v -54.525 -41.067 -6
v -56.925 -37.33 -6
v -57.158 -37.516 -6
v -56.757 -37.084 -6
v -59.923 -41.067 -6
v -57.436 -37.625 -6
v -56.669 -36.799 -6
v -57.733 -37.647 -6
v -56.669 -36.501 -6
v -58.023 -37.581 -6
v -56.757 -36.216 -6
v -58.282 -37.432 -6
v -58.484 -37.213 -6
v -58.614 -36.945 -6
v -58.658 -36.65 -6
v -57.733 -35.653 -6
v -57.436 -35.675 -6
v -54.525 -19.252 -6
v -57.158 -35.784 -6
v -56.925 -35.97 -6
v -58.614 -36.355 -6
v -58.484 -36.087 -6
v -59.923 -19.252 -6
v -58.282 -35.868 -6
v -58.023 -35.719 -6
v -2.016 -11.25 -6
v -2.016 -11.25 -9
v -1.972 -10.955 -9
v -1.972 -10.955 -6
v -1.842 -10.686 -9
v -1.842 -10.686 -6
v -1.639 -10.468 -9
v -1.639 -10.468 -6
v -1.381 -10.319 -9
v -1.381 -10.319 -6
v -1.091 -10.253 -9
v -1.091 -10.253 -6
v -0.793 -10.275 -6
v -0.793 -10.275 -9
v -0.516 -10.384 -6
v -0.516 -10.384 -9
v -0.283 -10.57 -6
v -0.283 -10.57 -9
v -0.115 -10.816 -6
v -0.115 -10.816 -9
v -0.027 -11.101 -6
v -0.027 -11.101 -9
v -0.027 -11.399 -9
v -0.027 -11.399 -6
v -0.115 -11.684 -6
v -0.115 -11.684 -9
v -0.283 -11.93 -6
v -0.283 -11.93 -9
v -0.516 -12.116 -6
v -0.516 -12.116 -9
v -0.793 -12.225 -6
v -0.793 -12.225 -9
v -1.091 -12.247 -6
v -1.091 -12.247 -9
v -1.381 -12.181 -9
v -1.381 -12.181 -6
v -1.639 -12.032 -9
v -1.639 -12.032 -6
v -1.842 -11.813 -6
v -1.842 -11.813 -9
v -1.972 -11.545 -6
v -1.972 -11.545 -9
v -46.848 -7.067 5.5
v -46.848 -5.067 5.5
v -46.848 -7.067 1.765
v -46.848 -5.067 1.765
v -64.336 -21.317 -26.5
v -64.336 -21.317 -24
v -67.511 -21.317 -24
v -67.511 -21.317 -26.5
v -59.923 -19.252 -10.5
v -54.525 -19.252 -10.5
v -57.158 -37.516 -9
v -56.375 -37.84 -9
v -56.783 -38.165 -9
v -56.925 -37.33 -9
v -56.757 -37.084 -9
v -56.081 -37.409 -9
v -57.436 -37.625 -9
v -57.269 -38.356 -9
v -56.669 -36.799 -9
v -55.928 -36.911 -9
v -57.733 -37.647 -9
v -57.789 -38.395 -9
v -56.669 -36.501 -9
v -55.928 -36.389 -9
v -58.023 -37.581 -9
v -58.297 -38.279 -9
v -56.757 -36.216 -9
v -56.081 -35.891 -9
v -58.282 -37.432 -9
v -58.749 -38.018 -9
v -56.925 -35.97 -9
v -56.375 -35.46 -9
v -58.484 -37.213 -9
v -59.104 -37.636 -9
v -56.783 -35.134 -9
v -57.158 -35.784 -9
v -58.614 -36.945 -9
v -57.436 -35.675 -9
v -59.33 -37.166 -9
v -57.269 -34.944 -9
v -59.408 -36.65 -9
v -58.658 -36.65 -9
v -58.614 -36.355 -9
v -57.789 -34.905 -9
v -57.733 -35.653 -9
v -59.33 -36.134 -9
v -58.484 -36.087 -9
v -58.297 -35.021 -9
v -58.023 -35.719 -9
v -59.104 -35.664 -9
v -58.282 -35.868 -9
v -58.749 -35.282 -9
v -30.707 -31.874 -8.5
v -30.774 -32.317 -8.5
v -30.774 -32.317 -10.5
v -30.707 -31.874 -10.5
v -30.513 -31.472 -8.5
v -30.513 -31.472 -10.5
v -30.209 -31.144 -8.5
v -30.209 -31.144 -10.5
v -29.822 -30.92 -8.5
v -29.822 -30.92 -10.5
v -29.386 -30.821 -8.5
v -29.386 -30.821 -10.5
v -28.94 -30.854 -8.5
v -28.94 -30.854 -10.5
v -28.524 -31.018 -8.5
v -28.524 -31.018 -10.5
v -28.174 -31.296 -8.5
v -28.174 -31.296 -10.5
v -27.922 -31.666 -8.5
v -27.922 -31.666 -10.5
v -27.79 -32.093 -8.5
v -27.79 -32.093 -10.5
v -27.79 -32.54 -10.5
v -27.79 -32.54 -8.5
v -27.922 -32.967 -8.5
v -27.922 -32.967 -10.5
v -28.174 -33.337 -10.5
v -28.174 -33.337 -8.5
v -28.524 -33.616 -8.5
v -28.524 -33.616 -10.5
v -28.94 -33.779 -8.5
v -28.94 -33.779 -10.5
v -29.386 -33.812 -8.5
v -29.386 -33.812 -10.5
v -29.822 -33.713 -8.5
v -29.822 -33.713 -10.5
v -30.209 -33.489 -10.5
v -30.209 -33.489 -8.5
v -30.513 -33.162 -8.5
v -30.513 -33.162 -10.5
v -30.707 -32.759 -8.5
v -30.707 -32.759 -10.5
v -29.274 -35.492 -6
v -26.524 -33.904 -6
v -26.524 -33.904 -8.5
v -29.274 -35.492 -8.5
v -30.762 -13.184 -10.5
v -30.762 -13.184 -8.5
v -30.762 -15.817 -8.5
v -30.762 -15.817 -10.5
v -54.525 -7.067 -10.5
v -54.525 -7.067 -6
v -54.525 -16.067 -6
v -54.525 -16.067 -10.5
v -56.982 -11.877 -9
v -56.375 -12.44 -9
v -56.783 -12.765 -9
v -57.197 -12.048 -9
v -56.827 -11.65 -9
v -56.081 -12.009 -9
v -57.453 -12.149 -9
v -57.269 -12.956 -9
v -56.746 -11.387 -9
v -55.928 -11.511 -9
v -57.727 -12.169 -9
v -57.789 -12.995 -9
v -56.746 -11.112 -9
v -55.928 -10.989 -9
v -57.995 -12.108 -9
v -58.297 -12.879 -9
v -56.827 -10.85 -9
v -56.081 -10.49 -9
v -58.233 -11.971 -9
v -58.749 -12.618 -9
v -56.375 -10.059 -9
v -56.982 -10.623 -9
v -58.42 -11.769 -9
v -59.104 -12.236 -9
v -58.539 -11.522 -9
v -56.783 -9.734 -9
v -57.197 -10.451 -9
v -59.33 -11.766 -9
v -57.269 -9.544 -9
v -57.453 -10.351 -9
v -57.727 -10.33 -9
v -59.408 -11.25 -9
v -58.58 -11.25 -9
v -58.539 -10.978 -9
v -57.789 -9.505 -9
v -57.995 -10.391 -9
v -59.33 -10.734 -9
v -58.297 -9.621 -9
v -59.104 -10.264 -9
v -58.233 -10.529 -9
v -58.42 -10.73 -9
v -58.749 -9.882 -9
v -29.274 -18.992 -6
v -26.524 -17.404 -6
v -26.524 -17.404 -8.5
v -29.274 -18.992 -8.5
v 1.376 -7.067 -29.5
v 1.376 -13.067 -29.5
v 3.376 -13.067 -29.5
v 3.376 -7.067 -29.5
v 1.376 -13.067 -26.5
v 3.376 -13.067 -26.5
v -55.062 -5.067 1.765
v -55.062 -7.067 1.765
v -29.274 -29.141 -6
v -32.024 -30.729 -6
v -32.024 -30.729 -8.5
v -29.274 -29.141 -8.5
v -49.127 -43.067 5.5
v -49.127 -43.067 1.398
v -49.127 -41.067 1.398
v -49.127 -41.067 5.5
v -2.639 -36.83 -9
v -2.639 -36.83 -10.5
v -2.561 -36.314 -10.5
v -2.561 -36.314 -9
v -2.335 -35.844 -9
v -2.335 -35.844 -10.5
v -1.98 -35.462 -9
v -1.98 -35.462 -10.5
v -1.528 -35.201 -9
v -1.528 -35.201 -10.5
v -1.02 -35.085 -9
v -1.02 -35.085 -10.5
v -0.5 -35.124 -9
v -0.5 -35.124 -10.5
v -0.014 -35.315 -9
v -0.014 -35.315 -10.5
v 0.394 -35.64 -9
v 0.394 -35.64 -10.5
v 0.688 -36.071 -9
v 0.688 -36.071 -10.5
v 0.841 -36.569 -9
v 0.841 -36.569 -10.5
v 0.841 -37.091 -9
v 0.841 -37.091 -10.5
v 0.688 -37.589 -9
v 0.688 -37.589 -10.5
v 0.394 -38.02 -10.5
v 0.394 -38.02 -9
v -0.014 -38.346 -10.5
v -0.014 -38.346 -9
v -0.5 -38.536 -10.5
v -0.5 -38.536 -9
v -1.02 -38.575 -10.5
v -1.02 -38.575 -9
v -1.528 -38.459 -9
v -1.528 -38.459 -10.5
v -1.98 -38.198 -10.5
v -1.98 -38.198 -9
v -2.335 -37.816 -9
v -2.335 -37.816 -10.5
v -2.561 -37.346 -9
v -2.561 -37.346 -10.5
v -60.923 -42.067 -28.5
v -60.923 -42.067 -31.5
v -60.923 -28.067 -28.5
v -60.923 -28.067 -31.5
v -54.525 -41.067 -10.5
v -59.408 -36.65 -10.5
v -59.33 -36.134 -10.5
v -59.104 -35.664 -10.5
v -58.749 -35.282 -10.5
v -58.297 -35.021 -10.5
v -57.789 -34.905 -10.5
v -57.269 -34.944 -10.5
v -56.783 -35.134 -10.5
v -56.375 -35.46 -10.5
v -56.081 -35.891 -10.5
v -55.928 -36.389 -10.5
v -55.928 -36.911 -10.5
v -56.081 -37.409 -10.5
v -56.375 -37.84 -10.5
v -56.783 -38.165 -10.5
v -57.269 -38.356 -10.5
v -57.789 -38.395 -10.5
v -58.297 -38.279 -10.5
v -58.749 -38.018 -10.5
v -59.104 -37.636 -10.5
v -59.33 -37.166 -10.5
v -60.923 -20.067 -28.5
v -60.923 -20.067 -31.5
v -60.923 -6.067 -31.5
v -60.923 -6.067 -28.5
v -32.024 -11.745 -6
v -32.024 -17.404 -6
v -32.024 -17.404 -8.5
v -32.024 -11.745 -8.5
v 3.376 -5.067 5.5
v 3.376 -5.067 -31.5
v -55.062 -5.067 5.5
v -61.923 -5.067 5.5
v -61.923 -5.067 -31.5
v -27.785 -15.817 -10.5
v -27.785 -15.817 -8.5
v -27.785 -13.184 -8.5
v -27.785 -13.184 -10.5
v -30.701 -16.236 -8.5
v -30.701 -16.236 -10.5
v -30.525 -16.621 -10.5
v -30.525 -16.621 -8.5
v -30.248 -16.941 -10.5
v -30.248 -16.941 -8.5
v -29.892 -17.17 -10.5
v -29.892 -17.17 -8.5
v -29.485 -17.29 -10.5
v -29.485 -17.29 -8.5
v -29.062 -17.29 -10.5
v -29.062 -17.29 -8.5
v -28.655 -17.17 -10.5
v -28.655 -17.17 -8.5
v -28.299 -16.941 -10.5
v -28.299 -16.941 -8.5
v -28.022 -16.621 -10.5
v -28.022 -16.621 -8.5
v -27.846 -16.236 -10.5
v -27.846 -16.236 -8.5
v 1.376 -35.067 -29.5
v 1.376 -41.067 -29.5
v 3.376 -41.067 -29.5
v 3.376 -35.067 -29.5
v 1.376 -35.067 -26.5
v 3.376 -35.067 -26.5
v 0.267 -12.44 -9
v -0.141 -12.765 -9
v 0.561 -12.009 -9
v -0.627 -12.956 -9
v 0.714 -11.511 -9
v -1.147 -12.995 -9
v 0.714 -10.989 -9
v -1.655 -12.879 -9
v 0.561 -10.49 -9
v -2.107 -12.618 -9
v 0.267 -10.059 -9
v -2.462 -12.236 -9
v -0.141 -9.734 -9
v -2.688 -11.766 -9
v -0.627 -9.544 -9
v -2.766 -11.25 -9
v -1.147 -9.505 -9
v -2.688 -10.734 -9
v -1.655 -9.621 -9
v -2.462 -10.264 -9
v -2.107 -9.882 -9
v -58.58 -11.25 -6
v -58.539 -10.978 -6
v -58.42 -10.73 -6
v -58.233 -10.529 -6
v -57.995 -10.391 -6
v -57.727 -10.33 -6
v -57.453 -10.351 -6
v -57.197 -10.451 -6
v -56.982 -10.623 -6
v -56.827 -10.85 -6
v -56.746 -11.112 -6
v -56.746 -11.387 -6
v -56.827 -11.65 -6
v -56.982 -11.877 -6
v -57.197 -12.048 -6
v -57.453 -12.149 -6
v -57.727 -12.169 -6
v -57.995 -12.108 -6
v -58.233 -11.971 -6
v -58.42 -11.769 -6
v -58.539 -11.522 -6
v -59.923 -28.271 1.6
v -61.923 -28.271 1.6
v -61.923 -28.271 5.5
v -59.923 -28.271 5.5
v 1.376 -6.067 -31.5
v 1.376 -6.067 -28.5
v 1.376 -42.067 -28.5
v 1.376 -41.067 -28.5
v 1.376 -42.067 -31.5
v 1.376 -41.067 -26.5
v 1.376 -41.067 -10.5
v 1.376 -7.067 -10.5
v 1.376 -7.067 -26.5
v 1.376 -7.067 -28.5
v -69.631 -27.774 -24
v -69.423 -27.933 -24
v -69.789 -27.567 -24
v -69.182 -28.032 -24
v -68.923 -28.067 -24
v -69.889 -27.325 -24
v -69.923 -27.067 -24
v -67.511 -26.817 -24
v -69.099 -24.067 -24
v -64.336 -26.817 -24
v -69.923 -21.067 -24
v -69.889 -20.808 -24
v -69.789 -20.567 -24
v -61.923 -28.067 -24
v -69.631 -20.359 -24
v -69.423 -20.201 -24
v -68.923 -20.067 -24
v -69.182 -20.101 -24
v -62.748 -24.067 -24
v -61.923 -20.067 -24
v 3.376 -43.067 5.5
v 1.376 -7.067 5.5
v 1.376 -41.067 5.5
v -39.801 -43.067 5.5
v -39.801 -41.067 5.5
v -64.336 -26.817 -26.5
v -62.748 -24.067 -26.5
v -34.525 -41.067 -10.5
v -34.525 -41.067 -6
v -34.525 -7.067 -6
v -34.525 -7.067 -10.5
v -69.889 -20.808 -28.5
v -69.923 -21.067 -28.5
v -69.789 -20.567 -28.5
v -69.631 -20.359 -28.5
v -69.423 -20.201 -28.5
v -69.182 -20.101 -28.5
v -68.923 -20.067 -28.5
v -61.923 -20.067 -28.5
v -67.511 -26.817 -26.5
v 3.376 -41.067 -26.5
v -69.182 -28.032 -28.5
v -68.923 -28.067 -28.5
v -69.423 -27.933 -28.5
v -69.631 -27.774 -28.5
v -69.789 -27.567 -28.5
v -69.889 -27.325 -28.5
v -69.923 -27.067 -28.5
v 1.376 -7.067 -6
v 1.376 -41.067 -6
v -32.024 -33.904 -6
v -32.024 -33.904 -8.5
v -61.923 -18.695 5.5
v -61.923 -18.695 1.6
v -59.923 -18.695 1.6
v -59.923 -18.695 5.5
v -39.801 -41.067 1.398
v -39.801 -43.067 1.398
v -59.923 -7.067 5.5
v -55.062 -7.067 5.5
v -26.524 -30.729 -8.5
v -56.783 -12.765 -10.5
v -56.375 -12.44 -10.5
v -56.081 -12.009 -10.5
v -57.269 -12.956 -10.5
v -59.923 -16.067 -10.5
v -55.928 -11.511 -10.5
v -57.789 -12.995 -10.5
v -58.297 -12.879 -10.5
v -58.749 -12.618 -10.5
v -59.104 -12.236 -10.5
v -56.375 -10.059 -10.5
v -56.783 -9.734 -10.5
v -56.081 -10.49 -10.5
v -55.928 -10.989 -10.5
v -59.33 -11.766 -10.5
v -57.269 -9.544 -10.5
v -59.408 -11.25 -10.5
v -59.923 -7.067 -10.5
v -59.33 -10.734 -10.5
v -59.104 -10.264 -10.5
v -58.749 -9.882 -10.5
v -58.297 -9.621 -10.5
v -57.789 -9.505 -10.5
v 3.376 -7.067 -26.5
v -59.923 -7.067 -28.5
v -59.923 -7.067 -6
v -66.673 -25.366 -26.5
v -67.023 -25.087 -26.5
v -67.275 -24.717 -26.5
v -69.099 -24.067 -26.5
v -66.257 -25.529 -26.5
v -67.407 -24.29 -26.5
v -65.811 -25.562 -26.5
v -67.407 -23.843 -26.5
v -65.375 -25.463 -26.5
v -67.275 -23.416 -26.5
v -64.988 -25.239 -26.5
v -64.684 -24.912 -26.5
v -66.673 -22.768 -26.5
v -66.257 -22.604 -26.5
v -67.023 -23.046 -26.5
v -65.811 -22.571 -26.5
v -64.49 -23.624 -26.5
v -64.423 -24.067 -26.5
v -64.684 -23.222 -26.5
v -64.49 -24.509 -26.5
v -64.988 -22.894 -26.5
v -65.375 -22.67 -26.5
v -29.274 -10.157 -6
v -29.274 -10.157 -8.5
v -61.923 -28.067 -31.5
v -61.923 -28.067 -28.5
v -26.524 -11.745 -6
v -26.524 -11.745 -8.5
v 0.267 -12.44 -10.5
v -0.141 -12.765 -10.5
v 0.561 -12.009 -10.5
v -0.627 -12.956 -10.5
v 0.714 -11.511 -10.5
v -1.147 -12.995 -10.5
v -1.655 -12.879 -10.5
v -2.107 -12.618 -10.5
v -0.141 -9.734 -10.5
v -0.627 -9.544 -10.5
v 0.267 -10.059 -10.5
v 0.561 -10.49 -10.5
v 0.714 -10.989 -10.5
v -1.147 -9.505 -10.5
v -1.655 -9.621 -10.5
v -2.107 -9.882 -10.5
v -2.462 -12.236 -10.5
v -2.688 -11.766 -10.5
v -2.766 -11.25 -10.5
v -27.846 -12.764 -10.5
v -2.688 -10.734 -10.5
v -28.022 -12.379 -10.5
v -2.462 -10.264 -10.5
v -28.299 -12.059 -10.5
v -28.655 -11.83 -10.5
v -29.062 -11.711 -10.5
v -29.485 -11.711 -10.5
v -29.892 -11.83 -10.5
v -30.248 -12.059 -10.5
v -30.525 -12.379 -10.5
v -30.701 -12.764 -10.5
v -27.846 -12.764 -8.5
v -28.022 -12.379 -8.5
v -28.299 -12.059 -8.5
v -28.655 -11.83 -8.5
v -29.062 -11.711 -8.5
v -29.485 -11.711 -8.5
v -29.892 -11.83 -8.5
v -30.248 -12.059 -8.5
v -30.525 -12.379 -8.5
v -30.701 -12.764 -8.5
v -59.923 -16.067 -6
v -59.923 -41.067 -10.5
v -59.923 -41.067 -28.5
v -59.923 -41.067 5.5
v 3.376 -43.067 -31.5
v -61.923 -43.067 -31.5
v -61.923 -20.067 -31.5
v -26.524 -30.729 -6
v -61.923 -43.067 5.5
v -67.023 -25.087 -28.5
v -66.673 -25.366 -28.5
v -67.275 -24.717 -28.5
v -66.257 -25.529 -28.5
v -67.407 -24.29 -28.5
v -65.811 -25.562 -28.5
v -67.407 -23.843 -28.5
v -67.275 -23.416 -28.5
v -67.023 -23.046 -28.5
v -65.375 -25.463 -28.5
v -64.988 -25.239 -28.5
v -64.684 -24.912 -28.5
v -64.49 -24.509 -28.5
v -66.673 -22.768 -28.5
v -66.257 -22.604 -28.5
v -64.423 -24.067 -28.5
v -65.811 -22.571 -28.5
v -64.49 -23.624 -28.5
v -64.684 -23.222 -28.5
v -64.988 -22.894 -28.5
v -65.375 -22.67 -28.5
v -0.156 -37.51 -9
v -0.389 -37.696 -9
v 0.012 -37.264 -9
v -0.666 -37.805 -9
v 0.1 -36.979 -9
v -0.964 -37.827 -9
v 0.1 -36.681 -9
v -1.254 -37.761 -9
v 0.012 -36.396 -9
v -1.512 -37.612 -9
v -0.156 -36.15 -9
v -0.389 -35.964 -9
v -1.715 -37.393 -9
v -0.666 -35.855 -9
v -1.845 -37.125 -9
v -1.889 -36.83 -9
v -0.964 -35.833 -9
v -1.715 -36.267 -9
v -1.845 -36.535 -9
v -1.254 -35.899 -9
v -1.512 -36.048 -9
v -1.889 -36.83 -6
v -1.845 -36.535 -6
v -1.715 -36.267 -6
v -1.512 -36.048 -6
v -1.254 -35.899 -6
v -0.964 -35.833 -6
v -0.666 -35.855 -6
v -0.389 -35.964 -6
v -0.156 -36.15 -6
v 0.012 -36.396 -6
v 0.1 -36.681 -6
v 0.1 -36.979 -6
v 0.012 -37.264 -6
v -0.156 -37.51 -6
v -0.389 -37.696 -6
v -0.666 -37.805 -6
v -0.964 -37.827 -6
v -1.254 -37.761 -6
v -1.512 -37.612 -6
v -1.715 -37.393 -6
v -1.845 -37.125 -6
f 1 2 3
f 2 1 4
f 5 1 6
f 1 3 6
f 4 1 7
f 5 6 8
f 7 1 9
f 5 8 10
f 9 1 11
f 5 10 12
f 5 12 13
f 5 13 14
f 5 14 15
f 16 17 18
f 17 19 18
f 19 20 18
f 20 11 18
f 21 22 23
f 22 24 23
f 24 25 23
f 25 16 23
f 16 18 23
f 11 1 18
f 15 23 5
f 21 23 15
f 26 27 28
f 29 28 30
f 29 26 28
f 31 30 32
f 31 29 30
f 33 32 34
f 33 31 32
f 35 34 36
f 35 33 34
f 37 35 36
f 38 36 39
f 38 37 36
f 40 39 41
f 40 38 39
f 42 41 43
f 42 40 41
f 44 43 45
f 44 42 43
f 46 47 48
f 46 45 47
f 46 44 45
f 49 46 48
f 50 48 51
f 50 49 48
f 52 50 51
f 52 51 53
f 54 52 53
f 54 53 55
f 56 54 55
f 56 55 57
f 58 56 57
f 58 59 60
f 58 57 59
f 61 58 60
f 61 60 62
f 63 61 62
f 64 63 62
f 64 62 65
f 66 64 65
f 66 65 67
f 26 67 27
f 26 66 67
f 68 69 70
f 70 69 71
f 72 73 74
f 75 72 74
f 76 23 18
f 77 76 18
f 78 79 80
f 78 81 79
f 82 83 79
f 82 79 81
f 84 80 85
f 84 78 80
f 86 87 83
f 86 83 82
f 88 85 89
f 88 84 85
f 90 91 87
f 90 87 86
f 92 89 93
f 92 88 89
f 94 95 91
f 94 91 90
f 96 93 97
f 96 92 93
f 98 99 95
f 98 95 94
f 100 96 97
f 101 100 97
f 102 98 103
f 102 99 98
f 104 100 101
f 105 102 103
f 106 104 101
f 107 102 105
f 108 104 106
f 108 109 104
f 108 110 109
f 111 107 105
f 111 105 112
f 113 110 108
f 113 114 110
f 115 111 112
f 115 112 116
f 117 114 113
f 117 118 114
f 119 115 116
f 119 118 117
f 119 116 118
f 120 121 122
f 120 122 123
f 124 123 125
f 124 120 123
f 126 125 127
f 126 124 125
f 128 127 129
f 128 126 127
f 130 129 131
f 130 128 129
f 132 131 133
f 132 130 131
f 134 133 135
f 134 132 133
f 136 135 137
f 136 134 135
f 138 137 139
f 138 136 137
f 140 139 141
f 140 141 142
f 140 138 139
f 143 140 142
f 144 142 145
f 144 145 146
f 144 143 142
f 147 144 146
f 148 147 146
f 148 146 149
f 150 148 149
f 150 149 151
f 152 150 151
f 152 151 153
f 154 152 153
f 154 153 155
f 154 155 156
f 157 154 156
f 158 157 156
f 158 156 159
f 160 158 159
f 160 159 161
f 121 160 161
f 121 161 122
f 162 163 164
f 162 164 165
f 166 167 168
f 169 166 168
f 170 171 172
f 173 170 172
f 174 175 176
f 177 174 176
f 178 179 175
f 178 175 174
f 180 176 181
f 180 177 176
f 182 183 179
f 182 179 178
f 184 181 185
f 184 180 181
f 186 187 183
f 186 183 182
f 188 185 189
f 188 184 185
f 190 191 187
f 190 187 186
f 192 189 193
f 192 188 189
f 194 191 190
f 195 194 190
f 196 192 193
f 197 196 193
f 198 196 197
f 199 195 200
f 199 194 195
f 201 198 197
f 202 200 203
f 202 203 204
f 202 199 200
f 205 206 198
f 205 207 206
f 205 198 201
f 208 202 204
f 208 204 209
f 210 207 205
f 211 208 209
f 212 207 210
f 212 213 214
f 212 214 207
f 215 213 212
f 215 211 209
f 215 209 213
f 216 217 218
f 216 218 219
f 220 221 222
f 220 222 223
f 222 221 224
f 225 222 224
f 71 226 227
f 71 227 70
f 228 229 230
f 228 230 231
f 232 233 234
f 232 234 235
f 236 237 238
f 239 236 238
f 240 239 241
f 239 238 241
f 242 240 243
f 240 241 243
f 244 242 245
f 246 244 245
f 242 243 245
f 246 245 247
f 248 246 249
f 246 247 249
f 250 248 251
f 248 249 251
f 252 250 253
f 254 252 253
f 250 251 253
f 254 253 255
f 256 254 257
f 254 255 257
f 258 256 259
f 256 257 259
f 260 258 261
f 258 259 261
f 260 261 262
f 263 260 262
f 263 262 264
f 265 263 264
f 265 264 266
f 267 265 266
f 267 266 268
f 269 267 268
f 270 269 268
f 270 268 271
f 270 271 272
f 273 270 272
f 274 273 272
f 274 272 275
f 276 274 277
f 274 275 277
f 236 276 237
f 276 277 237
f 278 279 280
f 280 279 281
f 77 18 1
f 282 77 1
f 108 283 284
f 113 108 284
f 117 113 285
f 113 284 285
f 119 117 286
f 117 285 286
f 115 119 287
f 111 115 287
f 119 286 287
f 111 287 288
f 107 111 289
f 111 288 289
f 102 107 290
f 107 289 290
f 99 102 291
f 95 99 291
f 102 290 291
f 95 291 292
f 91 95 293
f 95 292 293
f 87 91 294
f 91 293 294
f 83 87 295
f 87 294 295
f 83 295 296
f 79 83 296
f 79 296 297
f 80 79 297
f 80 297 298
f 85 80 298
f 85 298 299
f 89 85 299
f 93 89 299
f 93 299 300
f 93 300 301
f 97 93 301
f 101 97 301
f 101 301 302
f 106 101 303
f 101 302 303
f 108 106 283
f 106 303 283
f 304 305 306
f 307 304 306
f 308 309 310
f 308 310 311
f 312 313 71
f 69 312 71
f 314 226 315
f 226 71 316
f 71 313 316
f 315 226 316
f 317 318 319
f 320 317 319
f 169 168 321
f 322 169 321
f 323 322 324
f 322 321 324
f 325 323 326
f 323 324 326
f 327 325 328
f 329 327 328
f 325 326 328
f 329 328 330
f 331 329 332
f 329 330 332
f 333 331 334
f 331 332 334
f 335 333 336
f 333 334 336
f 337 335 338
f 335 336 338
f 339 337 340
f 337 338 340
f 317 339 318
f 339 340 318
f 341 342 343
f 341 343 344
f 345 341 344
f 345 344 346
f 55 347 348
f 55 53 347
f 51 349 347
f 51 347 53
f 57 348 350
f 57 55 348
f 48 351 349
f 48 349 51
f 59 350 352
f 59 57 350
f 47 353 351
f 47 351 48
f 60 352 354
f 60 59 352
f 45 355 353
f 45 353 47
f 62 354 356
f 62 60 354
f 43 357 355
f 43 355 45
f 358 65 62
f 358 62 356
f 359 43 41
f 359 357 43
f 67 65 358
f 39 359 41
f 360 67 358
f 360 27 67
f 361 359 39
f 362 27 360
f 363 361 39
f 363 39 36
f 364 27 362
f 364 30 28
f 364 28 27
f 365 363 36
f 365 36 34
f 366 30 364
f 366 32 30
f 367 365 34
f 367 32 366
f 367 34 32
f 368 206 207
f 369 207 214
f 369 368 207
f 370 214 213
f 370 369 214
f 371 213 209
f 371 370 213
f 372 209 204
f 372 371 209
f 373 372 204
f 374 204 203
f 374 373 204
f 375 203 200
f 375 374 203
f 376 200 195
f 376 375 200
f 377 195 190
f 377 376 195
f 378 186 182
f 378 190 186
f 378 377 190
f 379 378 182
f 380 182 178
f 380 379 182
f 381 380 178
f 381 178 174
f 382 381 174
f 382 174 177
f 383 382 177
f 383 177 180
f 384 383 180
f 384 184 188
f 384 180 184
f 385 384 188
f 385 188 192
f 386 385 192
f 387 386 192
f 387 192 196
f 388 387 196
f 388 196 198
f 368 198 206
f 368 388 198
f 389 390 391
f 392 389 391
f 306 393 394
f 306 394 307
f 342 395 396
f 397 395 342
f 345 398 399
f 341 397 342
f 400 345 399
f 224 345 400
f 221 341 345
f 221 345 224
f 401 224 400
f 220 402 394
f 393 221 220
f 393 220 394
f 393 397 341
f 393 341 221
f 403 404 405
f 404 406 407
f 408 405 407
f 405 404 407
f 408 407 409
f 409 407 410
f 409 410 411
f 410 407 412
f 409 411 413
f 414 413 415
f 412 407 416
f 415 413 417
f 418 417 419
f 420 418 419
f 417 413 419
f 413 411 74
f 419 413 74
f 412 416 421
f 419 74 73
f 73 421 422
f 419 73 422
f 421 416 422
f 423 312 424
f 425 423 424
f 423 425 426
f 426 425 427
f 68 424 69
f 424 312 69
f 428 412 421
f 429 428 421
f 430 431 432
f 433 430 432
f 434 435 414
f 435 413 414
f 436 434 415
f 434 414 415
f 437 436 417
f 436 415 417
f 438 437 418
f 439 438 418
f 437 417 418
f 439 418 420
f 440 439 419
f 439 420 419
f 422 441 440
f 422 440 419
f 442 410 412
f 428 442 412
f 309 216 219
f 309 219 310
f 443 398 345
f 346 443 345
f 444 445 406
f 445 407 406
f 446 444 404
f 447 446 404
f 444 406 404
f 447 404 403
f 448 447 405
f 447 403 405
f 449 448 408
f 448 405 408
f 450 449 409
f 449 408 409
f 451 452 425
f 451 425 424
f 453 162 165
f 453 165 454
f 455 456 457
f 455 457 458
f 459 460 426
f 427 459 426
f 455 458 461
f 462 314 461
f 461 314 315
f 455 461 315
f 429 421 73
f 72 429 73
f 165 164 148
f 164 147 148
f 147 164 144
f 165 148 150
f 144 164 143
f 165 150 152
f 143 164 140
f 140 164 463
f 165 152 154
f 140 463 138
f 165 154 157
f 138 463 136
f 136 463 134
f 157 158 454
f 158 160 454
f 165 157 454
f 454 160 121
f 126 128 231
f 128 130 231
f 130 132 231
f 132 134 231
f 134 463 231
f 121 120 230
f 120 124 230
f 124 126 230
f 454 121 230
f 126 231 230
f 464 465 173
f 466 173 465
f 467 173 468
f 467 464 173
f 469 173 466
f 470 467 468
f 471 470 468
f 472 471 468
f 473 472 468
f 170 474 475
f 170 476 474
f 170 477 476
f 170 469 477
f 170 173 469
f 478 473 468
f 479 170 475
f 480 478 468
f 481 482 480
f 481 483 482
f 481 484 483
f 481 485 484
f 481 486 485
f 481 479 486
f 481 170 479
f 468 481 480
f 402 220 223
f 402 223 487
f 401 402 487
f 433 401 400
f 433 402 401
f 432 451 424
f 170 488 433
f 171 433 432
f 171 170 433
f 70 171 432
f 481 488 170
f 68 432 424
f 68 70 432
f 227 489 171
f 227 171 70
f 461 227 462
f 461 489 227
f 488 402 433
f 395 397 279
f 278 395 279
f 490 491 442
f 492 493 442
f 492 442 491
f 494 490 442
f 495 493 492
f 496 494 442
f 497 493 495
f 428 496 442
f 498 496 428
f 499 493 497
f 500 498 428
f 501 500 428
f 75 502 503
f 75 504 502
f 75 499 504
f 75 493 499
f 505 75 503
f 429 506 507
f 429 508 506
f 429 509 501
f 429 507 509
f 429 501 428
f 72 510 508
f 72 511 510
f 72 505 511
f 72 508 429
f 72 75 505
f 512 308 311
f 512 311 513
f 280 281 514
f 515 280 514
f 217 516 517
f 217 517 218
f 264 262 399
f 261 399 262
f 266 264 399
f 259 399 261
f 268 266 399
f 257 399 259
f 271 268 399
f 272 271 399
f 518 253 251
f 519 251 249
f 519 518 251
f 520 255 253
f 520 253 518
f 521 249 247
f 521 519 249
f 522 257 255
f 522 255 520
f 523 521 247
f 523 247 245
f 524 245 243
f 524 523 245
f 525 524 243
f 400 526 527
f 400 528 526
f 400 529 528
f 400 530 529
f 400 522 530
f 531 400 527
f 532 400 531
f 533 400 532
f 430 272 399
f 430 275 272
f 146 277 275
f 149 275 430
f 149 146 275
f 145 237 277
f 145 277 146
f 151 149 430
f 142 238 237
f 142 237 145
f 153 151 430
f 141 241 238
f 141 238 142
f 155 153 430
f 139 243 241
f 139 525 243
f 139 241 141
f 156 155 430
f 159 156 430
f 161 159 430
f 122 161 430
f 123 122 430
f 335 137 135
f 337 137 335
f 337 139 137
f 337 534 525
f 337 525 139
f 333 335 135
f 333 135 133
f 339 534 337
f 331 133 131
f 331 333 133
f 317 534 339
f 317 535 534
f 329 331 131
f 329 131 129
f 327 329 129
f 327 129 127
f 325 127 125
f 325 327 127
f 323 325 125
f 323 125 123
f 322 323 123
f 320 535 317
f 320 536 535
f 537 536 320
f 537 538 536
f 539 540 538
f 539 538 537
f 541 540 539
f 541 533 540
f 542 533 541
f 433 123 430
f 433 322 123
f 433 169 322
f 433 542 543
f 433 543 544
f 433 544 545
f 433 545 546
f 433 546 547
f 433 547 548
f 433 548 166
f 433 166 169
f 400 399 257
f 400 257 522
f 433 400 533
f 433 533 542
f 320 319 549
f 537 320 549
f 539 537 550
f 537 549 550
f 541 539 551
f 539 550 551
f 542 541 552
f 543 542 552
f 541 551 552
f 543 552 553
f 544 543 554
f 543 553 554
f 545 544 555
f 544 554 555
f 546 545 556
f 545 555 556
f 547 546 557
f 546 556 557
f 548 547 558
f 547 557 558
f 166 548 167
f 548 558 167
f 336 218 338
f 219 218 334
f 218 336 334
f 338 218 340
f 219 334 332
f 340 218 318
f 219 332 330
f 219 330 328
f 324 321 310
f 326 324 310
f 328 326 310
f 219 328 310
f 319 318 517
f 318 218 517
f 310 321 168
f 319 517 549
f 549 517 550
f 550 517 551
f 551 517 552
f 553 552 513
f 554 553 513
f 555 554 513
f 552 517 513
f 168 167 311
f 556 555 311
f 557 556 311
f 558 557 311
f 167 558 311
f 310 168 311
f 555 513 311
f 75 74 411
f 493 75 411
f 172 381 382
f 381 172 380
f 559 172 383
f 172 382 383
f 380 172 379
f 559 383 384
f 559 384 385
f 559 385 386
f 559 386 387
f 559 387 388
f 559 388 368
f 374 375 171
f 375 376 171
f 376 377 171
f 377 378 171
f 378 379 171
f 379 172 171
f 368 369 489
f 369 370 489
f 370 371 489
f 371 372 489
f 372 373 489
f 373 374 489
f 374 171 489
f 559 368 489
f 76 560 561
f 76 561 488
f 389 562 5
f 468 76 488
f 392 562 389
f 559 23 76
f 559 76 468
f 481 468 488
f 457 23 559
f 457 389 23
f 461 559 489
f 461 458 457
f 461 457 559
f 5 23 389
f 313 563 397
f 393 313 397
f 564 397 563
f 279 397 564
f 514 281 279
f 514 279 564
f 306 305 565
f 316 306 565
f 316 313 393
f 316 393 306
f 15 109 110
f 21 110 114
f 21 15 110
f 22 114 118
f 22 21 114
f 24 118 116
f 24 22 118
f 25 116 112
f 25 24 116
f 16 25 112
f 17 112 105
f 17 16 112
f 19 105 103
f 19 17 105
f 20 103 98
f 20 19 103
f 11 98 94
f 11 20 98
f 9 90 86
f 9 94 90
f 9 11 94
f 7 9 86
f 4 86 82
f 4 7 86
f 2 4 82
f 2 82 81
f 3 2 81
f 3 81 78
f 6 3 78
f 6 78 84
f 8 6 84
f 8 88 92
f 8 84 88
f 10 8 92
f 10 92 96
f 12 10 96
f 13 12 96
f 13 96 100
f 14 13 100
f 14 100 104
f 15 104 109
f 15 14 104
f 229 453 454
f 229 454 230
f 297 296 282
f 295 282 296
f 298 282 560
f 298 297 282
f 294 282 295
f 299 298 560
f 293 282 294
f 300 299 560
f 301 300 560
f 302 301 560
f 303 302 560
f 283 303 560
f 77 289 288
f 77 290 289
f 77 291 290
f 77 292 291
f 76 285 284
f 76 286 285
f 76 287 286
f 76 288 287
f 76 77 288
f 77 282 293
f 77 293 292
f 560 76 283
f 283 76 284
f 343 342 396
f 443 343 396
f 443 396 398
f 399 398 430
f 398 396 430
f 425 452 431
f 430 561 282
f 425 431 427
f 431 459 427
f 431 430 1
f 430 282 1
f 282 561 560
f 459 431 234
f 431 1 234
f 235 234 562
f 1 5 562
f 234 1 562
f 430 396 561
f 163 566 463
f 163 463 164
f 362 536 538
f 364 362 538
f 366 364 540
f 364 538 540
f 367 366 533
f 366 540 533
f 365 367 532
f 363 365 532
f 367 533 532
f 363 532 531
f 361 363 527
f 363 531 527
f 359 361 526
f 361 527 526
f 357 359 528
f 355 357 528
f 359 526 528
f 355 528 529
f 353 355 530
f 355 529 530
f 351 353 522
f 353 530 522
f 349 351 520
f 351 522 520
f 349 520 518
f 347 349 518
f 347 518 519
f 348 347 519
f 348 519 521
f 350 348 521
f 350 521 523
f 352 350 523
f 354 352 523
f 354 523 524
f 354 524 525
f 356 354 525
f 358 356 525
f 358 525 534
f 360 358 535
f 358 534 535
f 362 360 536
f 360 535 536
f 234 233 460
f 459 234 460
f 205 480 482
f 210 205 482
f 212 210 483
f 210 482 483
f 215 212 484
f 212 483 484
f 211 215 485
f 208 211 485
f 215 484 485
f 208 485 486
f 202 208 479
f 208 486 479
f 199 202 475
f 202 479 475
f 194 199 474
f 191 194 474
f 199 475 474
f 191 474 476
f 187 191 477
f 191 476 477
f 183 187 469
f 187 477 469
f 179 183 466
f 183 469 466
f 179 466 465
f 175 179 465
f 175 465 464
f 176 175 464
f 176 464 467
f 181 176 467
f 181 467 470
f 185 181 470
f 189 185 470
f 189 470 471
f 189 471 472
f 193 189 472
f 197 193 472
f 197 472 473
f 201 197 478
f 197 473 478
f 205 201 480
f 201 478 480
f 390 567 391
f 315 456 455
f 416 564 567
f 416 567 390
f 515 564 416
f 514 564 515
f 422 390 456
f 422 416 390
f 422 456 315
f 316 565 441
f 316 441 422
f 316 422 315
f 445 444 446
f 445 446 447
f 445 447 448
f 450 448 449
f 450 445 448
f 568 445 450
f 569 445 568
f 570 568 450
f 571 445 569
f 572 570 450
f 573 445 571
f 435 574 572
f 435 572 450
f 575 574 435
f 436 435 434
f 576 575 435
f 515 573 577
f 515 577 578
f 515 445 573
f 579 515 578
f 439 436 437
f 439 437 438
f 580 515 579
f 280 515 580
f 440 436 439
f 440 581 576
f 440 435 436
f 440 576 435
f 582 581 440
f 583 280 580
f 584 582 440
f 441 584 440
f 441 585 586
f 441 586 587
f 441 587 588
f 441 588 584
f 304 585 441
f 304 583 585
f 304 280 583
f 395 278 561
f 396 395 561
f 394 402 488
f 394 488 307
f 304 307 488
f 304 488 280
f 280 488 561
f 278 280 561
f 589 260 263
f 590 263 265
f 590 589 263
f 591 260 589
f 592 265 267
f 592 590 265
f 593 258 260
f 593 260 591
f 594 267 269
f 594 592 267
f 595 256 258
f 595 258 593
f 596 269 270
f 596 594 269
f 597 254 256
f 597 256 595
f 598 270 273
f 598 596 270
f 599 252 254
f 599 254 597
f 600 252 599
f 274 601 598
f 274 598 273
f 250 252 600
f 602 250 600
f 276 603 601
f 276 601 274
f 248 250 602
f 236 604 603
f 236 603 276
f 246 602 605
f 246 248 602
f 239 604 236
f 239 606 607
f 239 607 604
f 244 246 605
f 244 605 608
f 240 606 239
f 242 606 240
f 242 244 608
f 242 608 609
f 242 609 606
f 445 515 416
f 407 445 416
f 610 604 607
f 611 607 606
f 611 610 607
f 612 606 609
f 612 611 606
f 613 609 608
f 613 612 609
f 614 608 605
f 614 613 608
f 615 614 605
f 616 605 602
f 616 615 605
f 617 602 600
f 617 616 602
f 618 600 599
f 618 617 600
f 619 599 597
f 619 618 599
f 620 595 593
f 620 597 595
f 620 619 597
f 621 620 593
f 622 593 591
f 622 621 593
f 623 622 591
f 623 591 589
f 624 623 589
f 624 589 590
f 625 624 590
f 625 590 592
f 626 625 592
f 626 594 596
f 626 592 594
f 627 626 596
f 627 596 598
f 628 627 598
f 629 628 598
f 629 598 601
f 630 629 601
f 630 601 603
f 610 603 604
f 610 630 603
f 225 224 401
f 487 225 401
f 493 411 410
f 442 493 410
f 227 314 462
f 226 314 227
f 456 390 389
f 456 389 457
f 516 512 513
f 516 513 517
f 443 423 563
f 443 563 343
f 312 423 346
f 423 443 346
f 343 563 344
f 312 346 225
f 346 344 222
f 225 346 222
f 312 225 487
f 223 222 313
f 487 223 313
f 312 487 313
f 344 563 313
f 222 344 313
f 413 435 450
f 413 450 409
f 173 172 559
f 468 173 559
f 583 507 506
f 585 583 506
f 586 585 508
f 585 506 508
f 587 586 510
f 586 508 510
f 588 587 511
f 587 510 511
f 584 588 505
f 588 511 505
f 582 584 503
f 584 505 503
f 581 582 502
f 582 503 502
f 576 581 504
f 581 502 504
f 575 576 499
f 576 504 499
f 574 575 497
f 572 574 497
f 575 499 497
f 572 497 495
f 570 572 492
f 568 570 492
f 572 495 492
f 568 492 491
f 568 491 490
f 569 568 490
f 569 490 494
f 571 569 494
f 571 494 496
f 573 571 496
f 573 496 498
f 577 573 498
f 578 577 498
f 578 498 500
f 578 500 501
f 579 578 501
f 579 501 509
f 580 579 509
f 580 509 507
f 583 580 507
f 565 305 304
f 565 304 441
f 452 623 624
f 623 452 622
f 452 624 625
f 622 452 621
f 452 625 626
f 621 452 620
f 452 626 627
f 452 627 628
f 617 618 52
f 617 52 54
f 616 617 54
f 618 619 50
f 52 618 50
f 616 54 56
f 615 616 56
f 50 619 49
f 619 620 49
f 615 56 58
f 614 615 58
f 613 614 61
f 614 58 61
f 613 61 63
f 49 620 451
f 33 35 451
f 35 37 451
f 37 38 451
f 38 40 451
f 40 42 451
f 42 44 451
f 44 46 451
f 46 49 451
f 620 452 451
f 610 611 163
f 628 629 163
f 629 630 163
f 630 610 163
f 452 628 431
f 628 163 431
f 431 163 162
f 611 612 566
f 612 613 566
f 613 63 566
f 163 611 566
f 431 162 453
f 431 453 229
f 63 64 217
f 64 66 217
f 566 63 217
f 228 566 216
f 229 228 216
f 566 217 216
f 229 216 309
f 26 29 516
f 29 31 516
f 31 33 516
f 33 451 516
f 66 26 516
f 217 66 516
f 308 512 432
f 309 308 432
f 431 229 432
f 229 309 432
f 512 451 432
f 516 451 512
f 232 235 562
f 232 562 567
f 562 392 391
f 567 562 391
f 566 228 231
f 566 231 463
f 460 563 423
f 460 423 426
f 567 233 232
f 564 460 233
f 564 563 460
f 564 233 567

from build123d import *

# Parameters (mm, degrees)
SKETCH_2_W           = 65.2997206
SKETCH_2_H           = 38
SKETCH_2_R           = 1.00000254
SKETCH_2_R_2         = 0.922218434
SKETCH_2_R_3         = 1.5
EXTRUDE_2_DEPTH      = 4.5
SKETCH_3_R           = 1.5
CUT_EXTRUDE_2_DEPTH  = 2.5
SKETCH_5_W           = 65.2997206
SKETCH_5_H           = 38
SKETCH_5_W_2         = 61.2997206
SKETCH_5_H_2         = 34
EXTRUDE_3_DEPTH      = 21
EXTRUDE_3_DEPTH_BACK = 16
SKETCH_7_W           = 8.214112973
SKETCH_7_H           = 3.795011114
CUT_EXTRUDE_4_DEPTH  = 3
SKETCH_8_W           = 4
SKETCH_8_H           = 9.575559499
CUT_EXTRUDE_5_DEPTH  = 3
SKETCH_9_W           = 9.326303795
SKETCH_9_H           = 4.202278939
CUT_EXTRUDE_6_DEPTH  = 3
CUT_EXTRUDE_7_DEPTH  = 10
SKETCH_15_R          = 1.75
CUT_EXTRUDE_8_DEPTH  = 1.5
SKETCH_18_W          = 62.2997206
SKETCH_18_H          = 36
CUT_EXTRUDE_9_DEPTH  = 3
SKETCH_19_W          = 3
SKETCH_19_H          = 6
CUT_EXTRUDE_10_DEPTH = 2
SKETCH_20_W          = 2
SKETCH_20_H          = 8
CUT_EXTRUDE_11_DEPTH = 3
SKETCH_21_W          = 4.5
SKETCH_21_H          = 8
EXTRUDE_4_DEPTH      = 8
SKETCH_22_R          = 1.5
CUT_EXTRUDE_12_DEPTH = 10
CUT_EXTRUDE_13_DEPTH = 2.5
FILLET_1_R           = 1


with BuildPart() as part:
    # 草图2 → 凸台-拉伸2 (new body)
    with BuildSketch(Plane(origin=(0, 0, -6), x_dir=(-1, 0, 0), z_dir=(0, 0, -1))):
        with Locations((29.273558547, -24.066548133)):
            Rectangle(SKETCH_2_W, SKETCH_2_H)
        with Locations((1.016002032, -11.24978156)):
            Circle(SKETCH_2_R, mode=Mode.SUBTRACT)
        with Locations((0.889001778, -36.83007366)):
            Circle(SKETCH_2_R, mode=Mode.SUBTRACT)
        with Locations((57.658115316, -36.64983236)):
            Circle(SKETCH_2_R, mode=Mode.SUBTRACT)
        with Locations((57.658115316, -11.24978156)):
            Circle(SKETCH_2_R_2, mode=Mode.SUBTRACT)
        with Locations((29.273558547, -32.316548133)):
            Circle(SKETCH_2_R_3, mode=Mode.SUBTRACT)
        with BuildLine():
            Line((27.785407033, -15.816548133), (27.785407033, -13.183619987))
            ThreePointArc((27.785407033, -13.183619987), (29.273558547, -11.695468472), (30.761710061, -13.183619987))
            Line((30.761710061, -13.183619987), (30.761710061, -15.816548133))
            ThreePointArc((30.761710061, -15.816548133), (29.273558547, -17.304699647), (27.785407033, -15.816548133))
        make_face(mode=Mode.SUBTRACT)
    extrude(amount=EXTRUDE_2_DEPTH)

    # 草图3 → 切除-拉伸2 (cut)
    with BuildSketch(Plane(origin=(0, 0, -6), x_dir=(-1, 0, 0), z_dir=(0, 0, -1))):
        Polygon((29.273558547, -18.991974614), (32.023558547, -17.404261373), (32.023558547, -14.920341582), (32.023558547, -14.228834893), (32.023558547, -11.744915102), (29.273558547, -10.157201862), (26.523558547, -11.744915102), (26.523558547, -14.228834893), (26.523558547, -14.920341582), (26.523558547, -17.404261373), align=None)
        with BuildLine():
            ThreePointArc((30.761710061, -15.816548133), (29.273558547, -17.304699647), (27.785407033, -15.816548133))
            Line((27.785407033, -15.816548133), (27.785407033, -13.183619987))
            ThreePointArc((27.785407033, -13.183619987), (29.273558547, -11.695468472), (30.761710061, -13.183619987))
            Line((30.761710061, -13.183619987), (30.761710061, -15.816548133))
        make_face(mode=Mode.SUBTRACT)
        Polygon((26.523558547, -30.728834893), (26.523558547, -33.904261373), (29.273558547, -35.491974614), (32.023558547, -33.904261373), (32.023558547, -30.728834893), (29.273558547, -29.141121653), align=None)
        with Locations((29.273558547, -32.316548133)):
            Circle(SKETCH_3_R, mode=Mode.SUBTRACT)
    extrude(amount=CUT_EXTRUDE_2_DEPTH, mode=Mode.SUBTRACT)

    # 草图5 → 凸台-拉伸3 (add, two sides)
    with BuildSketch(Plane(origin=(0, 0, -10.5), x_dir=(-1, 0, 0), z_dir=(0, 0, -1))) as extrude_3_sk:
        with Locations((29.273558547, -24.066548133)):
            Rectangle(SKETCH_5_W, SKETCH_5_H)
        with Locations((29.273558547, -24.066548133)):
            Rectangle(SKETCH_5_W_2, SKETCH_5_H_2, mode=Mode.SUBTRACT)
    extrude(amount=EXTRUDE_3_DEPTH)
    extrude(extrude_3_sk.sketch, amount=-EXTRUDE_3_DEPTH_BACK)

    # 草图7 → 切除-拉伸4 (cut)
    with BuildSketch(Plane(origin=(0, -5.066548133, 0), x_dir=(1, 0, 0), z_dir=(0, 1, 0))):
        with Locations((-50.955145133, -3.662545243)):
            Rectangle(SKETCH_7_W, SKETCH_7_H)
    extrude(amount=-CUT_EXTRUDE_4_DEPTH, mode=Mode.SUBTRACT)

    # 草图8 → 切除-拉伸5 (cut)
    with BuildSketch(Plane.ZY.offset(61.923418847)):
        with Locations((3.6000508, -23.483057223)):
            Rectangle(SKETCH_8_W, SKETCH_8_H)
    extrude(amount=-CUT_EXTRUDE_5_DEPTH, mode=Mode.SUBTRACT)

    # 草图9 → 切除-拉伸6 (cut)
    with BuildSketch(Plane.XZ.offset(43.066548133)):
        with Locations((-44.464129124, 3.49891133)):
            Rectangle(SKETCH_9_W, SKETCH_9_H)
    extrude(amount=-CUT_EXTRUDE_6_DEPTH, mode=Mode.SUBTRACT)

    # 草图13 → 切除-拉伸7 (cut)
    with BuildSketch(Plane.XY.offset(-6)):
        Polygon((-59.923418847, -16.066514367), (-59.923418847, -19.252115931), (-54.525349934, -19.252115931), (-54.525349934, -41.066548133), (-34.525349934, -41.066548133), (-34.525349934, -7.066548133), (-54.525349934, -7.066548133), (-54.525349934, -12.880912803), (-54.525349934, -16.066514367), align=None)
    extrude(amount=-CUT_EXTRUDE_7_DEPTH, mode=Mode.SUBTRACT)

    # 草图15 → 切除-拉伸8 (cut)
    with BuildSketch(Plane(origin=(0, 0, -10.5), x_dir=(-1, 0, 0), z_dir=(0, 0, -1))):
        with Locations((1.016002032, -11.24978156)):
            Circle(SKETCH_15_R)
        with Locations((57.658115316, -11.24978156)):
            Circle(SKETCH_15_R)
        with Locations((0.889001778, -36.83007366)):
            Circle(SKETCH_15_R)
        with Locations((57.658115316, -36.64983236)):
            Circle(SKETCH_15_R)
    extrude(amount=-CUT_EXTRUDE_8_DEPTH, mode=Mode.SUBTRACT)

    # 草图18 → 切除-拉伸9 (cut)
    with BuildSketch(Plane(origin=(0, 0, -31.5), x_dir=(-1, 0, 0), z_dir=(0, 0, -1))):
        with Locations((29.773558547, -24.066548133)):
            Rectangle(SKETCH_18_W, SKETCH_18_H)
    extrude(amount=-CUT_EXTRUDE_9_DEPTH, mode=Mode.SUBTRACT)

    # 草图19 → 切除-拉伸10 (cut)
    with BuildSketch(Plane.ZY.offset(-1.376301753)):
        with Locations((-28, -10.066548133)):
            Rectangle(SKETCH_19_W, SKETCH_19_H)
        with Locations((-28, -38.066548133)):
            Rectangle(SKETCH_19_W, SKETCH_19_H)
    extrude(amount=-CUT_EXTRUDE_10_DEPTH, mode=Mode.SUBTRACT)

    # 草图20 → 切除-拉伸11 (cut)
    with BuildSketch(Plane(origin=(0, 0, -31.5), x_dir=(-1, 0, 0), z_dir=(0, 0, -1))):
        with Locations((60.923418847, -24.066548133)):
            Rectangle(SKETCH_20_W, SKETCH_20_H)
    extrude(amount=-CUT_EXTRUDE_11_DEPTH, mode=Mode.SUBTRACT)

    # 草图21 → 凸台-拉伸4 (add)
    with BuildSketch(Plane.ZY.offset(61.923418847)):
        with Locations((-26.25, -24.066548133)):
            Rectangle(SKETCH_21_W, SKETCH_21_H)
    extrude(amount=EXTRUDE_4_DEPTH)

    # 草图22 → 切除-拉伸12 (cut)
    with BuildSketch(Plane.XY.offset(-24)):
        with Locations((-65.923418847, -24.066548133)):
            Circle(SKETCH_22_R)
    extrude(amount=-CUT_EXTRUDE_12_DEPTH, mode=Mode.SUBTRACT)

    # 草图23 → 切除-拉伸13 (cut)
    with BuildSketch(Plane.XY.offset(-24)):
        Polygon((-64.335705607, -26.816548133), (-62.747992366, -24.066548133), (-64.335705607, -21.316548133), (-67.511132087, -21.316548133), (-69.098845327, -24.066548133), (-67.511132087, -26.816548133), align=None)
    extrude(amount=-CUT_EXTRUDE_13_DEPTH, mode=Mode.SUBTRACT)

    # 圆角1
    fillet_1_edges = [part.edges().sort_by_distance(p)[0] for p in [
        (-69.923418847, -28.066548133, -26.25),
        (-69.923418847, -20.066548133, -26.25),
    ]]
    fillet(fillet_1_edges, radius=FILLET_1_R)


solid = part.part
